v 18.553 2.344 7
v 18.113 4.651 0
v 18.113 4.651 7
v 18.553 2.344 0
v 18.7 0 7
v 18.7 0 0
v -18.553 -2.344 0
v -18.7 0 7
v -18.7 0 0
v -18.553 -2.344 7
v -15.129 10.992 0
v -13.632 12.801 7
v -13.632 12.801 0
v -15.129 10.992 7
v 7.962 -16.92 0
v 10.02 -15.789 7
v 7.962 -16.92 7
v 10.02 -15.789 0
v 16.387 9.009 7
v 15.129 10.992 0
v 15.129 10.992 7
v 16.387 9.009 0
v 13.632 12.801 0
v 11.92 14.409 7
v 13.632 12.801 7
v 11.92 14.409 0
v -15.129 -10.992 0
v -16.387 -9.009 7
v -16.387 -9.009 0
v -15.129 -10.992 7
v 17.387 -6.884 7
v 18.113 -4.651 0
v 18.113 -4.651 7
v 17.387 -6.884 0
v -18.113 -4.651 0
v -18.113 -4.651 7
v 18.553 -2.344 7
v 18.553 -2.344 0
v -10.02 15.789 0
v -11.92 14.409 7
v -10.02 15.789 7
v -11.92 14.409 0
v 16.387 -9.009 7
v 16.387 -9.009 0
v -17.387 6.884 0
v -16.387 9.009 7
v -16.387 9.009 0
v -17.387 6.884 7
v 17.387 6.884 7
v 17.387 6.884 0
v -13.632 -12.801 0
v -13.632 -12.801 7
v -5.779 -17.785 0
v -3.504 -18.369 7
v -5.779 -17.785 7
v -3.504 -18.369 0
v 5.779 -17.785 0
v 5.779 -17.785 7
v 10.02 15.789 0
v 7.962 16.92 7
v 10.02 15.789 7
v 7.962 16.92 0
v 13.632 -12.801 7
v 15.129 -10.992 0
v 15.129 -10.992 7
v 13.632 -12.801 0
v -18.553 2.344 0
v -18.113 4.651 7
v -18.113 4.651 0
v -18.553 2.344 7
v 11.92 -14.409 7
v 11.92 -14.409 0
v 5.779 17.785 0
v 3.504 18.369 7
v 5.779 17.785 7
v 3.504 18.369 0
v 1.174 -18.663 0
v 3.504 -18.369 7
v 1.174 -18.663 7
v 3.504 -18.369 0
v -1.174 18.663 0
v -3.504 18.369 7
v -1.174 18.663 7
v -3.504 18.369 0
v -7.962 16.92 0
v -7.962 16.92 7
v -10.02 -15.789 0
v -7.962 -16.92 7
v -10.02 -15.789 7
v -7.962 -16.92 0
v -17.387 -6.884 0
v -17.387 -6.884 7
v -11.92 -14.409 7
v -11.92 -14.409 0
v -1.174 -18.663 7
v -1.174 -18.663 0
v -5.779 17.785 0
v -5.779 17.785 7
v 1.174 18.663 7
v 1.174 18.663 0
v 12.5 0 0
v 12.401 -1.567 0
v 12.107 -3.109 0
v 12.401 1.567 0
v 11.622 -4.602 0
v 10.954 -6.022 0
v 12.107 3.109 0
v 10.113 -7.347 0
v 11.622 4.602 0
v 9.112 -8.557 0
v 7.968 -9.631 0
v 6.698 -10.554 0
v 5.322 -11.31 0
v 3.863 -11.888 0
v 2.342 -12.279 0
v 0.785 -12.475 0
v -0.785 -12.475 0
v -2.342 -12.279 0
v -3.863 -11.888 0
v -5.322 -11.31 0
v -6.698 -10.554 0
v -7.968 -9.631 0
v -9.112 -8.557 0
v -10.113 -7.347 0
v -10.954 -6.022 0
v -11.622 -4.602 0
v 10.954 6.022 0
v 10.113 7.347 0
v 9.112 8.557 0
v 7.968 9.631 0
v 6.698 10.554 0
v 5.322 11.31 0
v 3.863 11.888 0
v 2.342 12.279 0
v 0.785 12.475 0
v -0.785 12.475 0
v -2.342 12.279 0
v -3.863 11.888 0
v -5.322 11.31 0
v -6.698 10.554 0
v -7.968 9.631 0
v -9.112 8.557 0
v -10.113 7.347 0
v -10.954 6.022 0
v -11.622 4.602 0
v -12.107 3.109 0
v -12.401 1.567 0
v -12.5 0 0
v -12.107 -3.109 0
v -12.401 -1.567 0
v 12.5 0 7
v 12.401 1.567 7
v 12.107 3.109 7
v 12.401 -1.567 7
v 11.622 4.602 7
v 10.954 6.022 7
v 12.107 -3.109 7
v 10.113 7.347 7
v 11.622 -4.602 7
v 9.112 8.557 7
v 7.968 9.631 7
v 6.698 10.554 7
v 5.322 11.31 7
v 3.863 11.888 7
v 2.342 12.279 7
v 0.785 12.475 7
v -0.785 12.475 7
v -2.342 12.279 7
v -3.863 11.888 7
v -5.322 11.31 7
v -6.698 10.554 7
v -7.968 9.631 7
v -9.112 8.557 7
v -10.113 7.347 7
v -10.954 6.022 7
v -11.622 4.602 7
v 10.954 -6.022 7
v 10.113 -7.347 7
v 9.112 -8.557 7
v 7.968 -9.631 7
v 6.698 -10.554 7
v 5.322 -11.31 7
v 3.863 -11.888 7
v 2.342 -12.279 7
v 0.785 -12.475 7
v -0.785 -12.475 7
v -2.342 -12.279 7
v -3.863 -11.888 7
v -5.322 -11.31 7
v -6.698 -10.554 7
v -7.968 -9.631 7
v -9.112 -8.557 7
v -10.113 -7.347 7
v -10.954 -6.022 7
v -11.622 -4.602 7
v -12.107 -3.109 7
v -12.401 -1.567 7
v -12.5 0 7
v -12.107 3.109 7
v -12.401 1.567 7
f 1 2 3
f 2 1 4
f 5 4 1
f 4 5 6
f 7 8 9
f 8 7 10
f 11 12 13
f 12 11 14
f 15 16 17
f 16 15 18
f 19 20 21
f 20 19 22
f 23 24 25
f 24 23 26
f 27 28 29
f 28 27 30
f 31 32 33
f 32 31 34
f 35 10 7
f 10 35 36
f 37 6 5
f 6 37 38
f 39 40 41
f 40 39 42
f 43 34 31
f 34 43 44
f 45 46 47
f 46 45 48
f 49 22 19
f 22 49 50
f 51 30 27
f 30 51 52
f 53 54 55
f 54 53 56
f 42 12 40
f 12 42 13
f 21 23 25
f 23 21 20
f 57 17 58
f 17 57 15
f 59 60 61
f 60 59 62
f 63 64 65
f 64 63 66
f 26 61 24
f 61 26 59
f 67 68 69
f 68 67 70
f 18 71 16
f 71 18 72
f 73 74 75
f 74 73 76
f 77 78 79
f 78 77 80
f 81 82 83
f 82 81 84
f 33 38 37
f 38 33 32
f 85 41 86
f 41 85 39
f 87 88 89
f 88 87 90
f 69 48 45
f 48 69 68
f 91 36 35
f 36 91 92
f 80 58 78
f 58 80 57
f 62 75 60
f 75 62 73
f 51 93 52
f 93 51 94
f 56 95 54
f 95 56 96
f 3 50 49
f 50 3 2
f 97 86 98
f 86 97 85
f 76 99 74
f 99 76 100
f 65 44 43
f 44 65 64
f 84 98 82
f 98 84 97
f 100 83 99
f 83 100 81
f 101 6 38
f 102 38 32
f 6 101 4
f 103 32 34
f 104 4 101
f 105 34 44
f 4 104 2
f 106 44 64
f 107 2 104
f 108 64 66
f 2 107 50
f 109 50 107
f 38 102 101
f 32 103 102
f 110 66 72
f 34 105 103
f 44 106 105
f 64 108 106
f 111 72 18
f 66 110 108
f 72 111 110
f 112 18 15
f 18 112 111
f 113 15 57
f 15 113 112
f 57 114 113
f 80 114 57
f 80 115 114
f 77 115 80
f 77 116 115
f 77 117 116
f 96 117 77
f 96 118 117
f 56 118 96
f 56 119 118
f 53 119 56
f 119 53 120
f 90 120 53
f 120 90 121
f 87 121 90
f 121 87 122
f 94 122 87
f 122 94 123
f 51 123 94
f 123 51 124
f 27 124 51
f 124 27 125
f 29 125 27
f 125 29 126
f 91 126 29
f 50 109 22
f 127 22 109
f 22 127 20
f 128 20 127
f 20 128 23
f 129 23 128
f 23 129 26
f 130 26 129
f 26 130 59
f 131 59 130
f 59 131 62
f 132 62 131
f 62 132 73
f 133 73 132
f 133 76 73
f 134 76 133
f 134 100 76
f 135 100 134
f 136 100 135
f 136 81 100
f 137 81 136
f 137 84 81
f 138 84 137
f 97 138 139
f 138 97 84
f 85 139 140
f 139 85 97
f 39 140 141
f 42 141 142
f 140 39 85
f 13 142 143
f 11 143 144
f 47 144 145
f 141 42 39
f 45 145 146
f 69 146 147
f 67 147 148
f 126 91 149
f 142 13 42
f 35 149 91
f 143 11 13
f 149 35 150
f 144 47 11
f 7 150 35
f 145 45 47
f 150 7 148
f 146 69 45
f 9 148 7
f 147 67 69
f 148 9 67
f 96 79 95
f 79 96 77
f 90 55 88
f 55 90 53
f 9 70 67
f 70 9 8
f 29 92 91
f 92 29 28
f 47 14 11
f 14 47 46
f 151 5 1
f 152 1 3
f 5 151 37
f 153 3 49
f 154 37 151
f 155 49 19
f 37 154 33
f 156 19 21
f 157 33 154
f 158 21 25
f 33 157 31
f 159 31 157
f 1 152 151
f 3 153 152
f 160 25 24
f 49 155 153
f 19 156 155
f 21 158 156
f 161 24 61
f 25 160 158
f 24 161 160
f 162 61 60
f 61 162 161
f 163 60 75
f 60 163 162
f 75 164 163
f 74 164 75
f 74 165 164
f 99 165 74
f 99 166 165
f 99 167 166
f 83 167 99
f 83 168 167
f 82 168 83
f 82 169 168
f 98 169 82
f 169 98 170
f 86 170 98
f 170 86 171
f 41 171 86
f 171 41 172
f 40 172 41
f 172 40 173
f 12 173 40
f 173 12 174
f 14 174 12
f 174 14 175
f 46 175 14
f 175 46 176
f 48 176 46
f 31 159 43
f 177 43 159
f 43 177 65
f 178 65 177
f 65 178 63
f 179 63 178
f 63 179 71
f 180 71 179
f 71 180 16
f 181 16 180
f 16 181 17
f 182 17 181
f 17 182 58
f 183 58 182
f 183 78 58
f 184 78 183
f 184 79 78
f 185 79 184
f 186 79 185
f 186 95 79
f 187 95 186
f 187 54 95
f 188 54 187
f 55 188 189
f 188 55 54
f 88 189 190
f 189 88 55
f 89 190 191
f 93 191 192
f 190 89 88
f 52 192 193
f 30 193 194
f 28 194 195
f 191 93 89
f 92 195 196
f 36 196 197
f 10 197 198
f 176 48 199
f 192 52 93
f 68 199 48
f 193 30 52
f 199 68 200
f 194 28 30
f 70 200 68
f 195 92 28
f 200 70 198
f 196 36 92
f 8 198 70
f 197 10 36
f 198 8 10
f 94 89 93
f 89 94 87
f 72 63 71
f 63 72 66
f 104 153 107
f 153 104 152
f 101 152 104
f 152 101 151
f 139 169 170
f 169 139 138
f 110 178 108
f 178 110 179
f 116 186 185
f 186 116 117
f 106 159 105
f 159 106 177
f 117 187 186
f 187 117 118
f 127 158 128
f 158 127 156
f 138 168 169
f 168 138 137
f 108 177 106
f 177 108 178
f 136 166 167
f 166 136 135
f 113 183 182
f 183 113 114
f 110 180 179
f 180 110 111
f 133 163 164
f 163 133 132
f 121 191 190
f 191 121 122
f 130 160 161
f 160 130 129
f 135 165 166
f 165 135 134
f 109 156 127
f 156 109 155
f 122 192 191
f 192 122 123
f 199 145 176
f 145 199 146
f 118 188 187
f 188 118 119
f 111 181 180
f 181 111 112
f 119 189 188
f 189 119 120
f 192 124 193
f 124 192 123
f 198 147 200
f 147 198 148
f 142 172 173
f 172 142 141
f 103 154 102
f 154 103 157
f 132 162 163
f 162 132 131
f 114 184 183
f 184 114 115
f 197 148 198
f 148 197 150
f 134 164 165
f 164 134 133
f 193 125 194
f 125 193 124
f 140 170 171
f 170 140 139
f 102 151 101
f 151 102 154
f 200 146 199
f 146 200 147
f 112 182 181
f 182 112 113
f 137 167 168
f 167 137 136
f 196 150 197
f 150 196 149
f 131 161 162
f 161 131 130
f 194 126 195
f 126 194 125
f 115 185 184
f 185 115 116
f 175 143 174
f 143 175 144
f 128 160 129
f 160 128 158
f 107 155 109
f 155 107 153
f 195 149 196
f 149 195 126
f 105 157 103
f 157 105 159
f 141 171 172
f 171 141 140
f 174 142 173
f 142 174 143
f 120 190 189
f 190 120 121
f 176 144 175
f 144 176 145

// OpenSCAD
$fn = 50;


difference() {
	union() {
		cylinder(h = 7, r = 18.7000000000);
	}
	union() {
		cylinder(h = 7, r = 12.5000000000);
	}
}
